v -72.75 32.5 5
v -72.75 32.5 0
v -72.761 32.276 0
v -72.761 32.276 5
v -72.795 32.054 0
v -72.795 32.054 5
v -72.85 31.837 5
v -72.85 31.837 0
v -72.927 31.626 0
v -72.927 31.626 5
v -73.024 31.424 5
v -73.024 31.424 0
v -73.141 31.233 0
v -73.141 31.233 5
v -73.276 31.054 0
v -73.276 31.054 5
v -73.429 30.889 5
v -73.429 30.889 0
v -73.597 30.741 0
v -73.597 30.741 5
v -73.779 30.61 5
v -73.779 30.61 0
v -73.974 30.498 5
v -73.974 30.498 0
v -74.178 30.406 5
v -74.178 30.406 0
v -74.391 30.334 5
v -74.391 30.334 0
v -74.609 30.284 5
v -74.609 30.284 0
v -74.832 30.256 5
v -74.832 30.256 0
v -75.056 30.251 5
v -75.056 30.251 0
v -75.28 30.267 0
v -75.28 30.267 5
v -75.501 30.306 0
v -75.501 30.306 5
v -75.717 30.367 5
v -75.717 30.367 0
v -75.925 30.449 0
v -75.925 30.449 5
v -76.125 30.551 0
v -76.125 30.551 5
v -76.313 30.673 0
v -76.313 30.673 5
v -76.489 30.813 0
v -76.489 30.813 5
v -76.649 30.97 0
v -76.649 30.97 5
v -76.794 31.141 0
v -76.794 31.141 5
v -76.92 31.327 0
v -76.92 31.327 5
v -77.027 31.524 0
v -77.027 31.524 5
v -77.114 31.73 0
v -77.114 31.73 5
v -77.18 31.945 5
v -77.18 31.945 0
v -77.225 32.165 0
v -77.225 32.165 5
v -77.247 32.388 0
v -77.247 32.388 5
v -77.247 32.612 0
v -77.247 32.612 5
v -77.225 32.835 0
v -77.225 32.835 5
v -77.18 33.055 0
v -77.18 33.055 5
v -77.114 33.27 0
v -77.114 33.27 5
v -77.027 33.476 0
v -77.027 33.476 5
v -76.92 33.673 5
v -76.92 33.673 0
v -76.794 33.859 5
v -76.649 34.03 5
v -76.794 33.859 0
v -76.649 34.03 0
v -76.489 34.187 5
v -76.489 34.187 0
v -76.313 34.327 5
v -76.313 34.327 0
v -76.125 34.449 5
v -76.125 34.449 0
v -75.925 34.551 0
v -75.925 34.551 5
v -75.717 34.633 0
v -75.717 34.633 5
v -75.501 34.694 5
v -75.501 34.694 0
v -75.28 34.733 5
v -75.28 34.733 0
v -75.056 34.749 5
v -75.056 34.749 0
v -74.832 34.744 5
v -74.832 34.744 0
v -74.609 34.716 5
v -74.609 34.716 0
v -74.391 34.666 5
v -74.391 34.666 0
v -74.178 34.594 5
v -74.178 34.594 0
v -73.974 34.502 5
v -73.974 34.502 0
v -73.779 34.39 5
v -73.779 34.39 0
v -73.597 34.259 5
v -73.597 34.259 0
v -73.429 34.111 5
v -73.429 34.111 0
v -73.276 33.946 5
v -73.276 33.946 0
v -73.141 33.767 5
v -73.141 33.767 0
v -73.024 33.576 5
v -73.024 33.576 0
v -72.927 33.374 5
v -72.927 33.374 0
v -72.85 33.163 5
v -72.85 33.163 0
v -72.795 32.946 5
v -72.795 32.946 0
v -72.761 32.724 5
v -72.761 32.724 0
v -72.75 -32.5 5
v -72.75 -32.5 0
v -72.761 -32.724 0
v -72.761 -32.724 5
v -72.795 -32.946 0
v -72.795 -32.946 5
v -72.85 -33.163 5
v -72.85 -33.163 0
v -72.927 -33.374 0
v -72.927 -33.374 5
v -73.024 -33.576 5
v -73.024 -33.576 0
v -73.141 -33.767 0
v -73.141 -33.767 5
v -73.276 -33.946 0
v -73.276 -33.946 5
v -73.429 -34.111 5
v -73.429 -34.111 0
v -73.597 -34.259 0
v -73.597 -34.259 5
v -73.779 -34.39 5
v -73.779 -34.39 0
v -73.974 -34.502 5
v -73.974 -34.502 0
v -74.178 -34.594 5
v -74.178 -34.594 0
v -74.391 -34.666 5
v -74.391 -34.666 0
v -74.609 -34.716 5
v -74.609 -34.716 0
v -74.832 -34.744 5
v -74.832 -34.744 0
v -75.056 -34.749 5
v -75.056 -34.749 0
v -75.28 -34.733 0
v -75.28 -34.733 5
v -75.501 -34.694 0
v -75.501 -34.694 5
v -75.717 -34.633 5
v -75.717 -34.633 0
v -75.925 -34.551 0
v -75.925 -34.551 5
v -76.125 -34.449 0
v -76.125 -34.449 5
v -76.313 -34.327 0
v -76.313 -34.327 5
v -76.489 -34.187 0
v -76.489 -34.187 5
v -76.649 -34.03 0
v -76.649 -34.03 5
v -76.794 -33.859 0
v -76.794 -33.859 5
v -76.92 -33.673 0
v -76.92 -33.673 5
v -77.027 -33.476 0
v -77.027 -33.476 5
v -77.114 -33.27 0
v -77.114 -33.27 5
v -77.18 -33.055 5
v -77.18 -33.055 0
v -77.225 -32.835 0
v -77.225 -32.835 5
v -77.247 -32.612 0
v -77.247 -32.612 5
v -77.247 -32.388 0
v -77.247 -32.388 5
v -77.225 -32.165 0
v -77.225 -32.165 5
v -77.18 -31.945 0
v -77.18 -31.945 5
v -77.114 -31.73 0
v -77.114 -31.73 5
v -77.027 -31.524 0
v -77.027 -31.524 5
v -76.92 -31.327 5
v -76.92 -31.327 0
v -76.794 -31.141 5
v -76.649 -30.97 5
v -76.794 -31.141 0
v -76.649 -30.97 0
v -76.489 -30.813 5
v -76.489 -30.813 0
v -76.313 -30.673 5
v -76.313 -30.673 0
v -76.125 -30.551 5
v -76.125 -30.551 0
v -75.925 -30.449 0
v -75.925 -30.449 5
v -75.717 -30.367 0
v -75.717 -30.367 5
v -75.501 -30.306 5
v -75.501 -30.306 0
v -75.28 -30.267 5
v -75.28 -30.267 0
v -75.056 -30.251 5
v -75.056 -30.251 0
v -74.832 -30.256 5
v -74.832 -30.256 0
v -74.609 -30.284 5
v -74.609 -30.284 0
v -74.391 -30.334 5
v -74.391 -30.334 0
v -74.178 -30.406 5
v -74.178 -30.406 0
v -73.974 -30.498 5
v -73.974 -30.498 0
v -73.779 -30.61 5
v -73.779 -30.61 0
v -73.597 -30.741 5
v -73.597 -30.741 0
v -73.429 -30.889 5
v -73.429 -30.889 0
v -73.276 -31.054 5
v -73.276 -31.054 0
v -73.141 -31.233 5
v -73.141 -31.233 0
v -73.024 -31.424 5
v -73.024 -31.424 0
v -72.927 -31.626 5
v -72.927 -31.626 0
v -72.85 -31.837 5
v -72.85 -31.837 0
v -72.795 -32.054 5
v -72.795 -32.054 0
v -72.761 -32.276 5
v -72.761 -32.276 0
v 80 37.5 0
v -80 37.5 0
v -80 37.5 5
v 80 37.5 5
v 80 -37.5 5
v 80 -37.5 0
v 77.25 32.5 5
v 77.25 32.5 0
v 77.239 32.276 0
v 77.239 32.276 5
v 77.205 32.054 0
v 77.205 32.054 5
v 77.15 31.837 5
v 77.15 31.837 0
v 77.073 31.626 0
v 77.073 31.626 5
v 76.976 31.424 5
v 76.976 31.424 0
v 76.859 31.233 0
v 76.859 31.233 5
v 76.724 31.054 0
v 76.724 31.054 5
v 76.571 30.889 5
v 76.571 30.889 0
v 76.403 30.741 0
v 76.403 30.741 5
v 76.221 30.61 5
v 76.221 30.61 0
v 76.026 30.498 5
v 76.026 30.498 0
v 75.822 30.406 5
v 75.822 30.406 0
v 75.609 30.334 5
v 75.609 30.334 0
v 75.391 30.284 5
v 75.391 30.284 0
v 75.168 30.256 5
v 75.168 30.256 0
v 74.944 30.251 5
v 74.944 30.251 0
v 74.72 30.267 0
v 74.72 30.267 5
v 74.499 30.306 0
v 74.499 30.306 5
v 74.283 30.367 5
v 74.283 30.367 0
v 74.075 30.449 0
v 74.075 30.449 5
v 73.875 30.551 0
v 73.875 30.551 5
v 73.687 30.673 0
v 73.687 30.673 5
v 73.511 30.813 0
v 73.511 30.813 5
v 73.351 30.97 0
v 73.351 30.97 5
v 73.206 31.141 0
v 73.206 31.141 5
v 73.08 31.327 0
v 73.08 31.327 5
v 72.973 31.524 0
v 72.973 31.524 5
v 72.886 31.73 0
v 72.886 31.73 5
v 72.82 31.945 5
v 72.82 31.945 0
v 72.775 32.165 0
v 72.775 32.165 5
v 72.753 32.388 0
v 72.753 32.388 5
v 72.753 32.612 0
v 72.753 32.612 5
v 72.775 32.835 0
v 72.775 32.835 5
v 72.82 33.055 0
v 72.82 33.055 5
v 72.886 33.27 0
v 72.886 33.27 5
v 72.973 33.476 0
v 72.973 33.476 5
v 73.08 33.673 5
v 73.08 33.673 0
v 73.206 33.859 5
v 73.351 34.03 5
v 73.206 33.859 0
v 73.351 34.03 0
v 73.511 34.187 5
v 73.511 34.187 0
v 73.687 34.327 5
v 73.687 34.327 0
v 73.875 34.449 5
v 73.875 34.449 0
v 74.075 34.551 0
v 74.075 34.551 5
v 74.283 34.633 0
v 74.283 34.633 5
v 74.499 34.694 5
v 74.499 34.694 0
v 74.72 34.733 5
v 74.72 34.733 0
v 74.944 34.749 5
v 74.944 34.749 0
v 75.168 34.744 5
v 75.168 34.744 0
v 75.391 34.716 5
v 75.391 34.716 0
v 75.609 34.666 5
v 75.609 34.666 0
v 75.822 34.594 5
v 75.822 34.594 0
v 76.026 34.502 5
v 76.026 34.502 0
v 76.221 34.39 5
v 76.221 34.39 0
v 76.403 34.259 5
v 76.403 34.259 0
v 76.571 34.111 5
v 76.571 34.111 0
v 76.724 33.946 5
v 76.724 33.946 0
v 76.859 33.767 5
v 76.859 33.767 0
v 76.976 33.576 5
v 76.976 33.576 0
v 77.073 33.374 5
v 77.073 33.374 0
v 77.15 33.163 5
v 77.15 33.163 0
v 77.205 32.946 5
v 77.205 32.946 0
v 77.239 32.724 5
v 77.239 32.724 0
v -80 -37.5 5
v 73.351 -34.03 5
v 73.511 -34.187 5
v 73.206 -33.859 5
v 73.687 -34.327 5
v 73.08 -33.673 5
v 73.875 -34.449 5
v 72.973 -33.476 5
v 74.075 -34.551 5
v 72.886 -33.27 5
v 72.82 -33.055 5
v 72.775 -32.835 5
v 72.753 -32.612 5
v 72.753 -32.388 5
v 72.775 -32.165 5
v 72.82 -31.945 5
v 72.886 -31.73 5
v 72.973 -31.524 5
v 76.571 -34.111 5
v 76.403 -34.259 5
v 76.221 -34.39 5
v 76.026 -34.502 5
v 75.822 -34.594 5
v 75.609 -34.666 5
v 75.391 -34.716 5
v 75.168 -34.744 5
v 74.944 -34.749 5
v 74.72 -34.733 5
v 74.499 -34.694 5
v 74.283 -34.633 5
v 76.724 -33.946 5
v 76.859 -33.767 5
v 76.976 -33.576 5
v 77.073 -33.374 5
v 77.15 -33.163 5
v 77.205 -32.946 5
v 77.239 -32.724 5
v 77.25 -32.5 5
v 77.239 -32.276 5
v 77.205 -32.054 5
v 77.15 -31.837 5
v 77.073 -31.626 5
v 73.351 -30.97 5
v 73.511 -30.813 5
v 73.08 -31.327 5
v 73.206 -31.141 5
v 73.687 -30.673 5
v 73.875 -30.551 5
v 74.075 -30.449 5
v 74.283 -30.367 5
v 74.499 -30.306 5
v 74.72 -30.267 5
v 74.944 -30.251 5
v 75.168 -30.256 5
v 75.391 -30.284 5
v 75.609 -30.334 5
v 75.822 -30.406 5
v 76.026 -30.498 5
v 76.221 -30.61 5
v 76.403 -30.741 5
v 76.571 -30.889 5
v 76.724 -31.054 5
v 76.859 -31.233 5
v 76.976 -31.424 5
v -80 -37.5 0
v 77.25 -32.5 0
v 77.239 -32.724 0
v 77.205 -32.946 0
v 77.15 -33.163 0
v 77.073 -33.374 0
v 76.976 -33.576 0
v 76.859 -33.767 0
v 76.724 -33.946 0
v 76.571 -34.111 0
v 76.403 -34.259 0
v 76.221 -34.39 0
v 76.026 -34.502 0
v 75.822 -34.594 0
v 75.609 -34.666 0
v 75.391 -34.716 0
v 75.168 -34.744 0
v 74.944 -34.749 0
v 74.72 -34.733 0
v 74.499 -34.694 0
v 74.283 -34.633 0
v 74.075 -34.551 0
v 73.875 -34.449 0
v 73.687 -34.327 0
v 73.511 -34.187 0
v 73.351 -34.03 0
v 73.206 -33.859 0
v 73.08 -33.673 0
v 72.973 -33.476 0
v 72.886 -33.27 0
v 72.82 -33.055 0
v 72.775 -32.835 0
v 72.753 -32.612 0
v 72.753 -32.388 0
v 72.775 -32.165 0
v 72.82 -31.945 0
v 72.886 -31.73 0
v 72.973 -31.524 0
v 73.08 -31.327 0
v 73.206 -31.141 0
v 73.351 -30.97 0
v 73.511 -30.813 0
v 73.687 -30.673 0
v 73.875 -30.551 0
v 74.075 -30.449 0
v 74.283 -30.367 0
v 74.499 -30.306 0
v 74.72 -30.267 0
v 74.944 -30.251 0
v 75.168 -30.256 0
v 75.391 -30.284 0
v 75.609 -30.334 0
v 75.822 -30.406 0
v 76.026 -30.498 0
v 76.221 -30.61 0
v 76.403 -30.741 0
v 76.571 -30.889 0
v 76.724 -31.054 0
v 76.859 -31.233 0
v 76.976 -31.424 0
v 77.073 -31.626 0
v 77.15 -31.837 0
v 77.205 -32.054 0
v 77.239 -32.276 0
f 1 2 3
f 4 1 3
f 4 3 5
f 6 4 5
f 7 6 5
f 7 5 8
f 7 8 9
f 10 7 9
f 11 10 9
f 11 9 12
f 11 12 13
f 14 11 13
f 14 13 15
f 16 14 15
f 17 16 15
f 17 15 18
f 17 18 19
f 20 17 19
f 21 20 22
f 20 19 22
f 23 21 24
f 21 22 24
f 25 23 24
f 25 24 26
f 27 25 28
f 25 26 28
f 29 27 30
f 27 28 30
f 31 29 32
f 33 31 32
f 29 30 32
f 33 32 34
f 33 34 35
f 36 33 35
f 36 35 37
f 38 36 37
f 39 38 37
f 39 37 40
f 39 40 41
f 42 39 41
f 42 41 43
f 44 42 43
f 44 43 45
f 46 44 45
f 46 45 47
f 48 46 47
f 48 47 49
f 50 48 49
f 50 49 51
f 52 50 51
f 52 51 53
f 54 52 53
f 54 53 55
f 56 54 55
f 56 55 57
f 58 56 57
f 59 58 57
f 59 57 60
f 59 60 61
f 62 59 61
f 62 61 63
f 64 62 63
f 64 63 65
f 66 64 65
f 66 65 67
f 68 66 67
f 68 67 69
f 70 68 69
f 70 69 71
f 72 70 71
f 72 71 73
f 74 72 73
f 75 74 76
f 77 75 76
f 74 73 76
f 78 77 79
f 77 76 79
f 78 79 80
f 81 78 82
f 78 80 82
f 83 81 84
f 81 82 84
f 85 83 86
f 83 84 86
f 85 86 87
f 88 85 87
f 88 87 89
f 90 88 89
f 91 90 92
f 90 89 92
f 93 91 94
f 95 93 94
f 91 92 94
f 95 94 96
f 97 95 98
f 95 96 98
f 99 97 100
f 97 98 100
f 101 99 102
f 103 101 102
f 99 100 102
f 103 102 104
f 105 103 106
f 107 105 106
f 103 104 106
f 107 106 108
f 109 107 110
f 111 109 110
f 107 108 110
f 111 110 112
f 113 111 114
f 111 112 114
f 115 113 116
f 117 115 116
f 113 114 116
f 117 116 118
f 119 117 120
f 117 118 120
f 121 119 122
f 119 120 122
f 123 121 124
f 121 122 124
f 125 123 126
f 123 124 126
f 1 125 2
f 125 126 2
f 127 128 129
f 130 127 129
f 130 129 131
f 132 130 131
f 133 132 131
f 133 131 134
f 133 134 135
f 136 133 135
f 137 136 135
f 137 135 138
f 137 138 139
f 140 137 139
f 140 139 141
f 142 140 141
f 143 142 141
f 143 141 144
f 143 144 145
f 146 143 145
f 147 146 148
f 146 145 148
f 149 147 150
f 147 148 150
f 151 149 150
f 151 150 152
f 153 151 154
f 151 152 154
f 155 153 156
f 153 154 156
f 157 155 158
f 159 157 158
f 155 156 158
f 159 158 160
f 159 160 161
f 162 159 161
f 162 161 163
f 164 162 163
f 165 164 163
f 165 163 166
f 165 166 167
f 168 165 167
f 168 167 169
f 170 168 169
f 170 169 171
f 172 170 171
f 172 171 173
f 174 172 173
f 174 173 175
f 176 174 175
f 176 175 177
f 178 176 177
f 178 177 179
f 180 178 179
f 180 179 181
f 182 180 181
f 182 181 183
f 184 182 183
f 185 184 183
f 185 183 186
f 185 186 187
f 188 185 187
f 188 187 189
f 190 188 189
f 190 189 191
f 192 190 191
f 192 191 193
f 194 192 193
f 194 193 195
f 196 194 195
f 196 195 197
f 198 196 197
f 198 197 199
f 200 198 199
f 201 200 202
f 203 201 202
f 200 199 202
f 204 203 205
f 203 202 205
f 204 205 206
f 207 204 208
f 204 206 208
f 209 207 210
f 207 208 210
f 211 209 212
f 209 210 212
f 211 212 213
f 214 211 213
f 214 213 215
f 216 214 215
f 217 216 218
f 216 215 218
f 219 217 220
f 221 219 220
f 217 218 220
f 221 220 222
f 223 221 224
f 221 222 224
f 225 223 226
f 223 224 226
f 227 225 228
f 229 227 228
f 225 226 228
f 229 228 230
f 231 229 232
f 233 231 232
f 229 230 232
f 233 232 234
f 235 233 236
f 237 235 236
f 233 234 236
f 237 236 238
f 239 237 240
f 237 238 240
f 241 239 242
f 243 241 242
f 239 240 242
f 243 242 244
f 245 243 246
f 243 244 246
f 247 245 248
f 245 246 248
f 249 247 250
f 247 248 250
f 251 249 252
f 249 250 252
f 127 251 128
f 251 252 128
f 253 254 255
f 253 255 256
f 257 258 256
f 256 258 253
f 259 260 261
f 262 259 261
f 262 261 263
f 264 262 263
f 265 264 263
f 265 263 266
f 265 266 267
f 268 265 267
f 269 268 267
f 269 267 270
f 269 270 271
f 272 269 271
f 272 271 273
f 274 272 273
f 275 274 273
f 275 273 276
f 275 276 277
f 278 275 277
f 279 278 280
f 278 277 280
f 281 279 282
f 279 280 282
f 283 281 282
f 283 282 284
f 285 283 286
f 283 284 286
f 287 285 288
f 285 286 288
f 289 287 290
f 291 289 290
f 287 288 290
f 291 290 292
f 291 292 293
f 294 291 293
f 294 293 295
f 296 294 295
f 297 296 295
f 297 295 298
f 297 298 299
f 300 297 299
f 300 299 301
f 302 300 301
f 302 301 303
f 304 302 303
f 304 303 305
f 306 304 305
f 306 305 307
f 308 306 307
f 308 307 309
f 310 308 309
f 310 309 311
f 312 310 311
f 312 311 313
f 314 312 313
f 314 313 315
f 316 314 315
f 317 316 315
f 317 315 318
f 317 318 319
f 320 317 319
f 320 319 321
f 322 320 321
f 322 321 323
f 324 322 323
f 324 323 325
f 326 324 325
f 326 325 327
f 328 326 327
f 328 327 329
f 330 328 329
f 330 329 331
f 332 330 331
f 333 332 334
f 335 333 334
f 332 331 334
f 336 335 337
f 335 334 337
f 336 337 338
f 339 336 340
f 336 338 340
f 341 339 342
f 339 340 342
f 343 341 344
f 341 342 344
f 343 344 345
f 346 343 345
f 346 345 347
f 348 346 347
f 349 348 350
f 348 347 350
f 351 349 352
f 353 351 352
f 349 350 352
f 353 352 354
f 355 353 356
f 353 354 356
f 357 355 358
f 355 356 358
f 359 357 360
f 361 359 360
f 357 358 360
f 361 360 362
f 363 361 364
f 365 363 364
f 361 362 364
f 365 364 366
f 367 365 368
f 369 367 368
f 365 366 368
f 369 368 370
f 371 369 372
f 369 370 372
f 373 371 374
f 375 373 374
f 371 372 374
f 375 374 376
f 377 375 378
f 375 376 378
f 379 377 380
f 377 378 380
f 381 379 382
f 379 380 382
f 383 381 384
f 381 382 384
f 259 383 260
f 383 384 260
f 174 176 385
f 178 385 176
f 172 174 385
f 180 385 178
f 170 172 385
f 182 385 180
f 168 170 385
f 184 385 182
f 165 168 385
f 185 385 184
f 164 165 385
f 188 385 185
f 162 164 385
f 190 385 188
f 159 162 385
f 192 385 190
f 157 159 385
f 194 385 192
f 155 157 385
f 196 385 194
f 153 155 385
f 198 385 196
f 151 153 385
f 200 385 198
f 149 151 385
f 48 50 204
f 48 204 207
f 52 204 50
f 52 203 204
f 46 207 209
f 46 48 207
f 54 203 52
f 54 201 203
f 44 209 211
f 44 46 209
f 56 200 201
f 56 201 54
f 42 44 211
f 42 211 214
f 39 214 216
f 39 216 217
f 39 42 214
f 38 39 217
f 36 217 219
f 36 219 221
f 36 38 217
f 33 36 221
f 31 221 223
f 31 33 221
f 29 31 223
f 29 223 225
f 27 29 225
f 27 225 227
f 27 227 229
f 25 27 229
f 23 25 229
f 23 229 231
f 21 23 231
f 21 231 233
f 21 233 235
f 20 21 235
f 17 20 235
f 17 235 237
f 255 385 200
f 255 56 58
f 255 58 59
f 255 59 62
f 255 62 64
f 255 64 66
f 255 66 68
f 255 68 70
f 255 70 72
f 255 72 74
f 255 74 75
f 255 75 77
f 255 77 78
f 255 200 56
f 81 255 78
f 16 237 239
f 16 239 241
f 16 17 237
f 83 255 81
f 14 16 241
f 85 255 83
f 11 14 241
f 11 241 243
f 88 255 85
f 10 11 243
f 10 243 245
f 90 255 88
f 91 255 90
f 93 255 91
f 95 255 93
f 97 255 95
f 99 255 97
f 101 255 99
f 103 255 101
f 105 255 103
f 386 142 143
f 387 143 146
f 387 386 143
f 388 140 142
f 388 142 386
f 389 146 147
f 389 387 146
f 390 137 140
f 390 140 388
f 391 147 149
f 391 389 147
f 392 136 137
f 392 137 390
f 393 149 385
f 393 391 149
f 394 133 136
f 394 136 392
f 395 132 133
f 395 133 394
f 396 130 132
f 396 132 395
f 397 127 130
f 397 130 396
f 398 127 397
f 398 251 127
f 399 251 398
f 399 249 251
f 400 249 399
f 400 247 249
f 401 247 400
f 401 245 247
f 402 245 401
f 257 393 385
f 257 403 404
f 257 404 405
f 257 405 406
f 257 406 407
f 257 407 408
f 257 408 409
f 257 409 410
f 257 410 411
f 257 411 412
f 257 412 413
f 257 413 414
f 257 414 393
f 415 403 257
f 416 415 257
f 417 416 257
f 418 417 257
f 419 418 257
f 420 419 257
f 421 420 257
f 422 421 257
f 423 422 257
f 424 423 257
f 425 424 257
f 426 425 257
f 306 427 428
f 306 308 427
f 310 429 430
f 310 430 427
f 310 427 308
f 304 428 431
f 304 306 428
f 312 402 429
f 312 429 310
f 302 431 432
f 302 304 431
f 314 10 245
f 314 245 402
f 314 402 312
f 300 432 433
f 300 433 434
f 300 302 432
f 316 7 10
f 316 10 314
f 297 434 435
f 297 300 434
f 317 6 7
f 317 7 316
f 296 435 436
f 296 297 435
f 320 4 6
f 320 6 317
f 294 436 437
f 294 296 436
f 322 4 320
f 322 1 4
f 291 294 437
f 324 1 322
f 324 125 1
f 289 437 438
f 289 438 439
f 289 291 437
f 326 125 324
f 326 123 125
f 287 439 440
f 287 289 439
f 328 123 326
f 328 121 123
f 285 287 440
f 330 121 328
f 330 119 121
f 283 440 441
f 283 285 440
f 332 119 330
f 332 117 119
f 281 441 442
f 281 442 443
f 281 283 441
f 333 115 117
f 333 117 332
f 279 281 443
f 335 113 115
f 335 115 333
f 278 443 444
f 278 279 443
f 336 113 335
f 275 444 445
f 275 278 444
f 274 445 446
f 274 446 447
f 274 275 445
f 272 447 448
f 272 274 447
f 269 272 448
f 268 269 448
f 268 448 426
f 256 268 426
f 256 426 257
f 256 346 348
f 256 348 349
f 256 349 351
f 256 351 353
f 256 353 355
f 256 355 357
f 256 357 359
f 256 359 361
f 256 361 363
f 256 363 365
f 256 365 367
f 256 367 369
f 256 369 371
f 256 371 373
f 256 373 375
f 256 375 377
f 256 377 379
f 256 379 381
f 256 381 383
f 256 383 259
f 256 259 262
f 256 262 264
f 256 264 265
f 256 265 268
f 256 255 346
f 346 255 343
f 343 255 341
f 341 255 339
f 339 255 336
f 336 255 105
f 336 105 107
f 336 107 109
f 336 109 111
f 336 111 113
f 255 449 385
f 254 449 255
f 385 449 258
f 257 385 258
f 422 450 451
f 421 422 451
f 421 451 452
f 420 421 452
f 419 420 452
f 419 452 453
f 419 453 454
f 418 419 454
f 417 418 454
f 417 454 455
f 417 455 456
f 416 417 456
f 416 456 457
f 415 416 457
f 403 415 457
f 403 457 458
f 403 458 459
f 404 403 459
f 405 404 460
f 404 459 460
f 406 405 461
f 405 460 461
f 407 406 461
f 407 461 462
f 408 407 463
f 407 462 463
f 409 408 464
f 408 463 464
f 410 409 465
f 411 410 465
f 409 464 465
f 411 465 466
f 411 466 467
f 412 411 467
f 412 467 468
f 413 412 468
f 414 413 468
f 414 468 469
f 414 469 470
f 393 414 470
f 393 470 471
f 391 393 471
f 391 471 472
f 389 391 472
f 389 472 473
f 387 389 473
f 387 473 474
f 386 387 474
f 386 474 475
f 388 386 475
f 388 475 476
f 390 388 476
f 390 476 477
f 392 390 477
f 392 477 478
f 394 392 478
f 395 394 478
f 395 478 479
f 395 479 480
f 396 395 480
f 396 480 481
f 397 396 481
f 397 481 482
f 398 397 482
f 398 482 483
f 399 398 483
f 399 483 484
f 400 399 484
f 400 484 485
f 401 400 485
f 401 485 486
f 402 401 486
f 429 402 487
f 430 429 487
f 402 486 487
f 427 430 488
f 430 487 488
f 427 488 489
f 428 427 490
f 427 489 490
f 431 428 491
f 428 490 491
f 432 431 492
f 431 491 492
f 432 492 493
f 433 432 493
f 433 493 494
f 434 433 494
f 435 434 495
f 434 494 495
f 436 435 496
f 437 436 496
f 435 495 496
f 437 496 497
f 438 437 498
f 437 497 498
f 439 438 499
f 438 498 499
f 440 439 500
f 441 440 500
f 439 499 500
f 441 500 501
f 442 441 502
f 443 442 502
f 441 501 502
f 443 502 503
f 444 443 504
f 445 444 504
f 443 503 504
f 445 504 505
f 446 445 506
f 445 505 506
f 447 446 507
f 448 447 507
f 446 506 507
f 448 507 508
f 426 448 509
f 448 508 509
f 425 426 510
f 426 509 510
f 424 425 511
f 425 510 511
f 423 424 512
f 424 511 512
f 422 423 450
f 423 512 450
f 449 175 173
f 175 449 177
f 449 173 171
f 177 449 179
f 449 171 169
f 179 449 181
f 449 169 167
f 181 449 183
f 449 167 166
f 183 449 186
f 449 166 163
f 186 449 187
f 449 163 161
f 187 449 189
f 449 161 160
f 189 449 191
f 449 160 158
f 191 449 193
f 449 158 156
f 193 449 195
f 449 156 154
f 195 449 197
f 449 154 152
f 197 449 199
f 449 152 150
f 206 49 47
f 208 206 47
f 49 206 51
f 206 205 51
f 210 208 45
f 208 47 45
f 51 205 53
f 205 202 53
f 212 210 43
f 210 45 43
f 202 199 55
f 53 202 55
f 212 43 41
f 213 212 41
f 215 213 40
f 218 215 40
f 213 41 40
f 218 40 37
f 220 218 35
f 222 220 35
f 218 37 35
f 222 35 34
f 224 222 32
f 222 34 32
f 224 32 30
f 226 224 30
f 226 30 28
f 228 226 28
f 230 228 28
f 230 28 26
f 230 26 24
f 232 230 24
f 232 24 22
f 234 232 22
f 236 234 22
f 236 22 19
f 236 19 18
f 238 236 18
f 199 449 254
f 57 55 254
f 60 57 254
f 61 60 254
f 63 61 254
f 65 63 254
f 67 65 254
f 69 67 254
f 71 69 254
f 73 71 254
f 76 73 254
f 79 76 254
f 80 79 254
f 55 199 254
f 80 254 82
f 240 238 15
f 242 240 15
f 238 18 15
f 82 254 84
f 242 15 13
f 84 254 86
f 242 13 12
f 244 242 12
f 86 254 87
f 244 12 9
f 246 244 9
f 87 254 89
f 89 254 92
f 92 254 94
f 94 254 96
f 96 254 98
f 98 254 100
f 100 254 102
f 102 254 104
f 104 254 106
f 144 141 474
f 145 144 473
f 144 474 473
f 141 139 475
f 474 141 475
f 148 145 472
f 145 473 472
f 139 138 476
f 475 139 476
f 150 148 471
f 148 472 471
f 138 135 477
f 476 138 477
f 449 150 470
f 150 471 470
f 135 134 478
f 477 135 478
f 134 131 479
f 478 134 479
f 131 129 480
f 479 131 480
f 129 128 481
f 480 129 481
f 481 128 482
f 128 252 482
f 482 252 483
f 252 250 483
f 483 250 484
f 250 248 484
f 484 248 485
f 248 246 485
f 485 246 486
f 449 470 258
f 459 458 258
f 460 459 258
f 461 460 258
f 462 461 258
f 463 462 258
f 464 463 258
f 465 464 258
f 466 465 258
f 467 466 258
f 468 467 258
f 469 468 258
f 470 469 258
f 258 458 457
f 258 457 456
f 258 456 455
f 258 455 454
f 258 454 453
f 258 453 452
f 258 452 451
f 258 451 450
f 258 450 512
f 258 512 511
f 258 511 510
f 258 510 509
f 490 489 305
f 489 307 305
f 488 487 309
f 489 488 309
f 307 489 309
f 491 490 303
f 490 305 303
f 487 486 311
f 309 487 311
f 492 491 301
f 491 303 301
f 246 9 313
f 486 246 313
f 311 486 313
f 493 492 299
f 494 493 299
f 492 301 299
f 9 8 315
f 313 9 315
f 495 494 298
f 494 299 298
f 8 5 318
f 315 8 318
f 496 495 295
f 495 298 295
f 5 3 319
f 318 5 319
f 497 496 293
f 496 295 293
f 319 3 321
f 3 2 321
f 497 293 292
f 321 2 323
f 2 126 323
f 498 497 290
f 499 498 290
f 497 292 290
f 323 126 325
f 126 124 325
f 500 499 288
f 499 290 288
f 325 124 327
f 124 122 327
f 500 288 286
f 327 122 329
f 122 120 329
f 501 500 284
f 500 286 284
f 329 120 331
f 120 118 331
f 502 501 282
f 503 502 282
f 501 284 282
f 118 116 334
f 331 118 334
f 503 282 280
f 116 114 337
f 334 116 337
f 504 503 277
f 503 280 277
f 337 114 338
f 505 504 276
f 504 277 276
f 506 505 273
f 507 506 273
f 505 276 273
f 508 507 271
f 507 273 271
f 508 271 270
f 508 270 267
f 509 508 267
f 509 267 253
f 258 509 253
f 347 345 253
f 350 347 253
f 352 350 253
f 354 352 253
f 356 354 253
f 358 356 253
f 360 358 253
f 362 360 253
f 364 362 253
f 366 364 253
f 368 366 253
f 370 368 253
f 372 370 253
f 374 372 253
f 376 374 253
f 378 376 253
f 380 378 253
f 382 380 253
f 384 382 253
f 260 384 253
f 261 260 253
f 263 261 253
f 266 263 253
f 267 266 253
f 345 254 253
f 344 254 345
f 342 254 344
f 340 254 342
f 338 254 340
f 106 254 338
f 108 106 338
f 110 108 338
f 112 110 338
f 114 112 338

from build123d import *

# Parameters (mm, degrees)
SKETCH_W    = 160
SKETCH_H    = 75
PAD_DEPTH   = 5
SKETCH001_R = 2.25
HOLE_DEPTH  = 5.001


with BuildPart() as part:
    # Sketch → Pad (new body)
    with BuildSketch(Plane.XY):
        Rectangle(SKETCH_W, SKETCH_H)
    extrude(amount=PAD_DEPTH)

    # Sketch001 (on Face5 of Pad) → Hole (cut, through all)
    with BuildSketch(Plane(origin=(0, 0, 0), x_dir=(1, 0, 0), z_dir=(0, 0, -1))):
        with Locations((-75, 32.5)):
            Circle(SKETCH001_R)
        with Locations((75, 32.5)):
            Circle(SKETCH001_R)
        with Locations((75, -32.5)):
            Circle(SKETCH001_R)
        with Locations((-75, -32.5)):
            Circle(SKETCH001_R)
    extrude(amount=-HOLE_DEPTH, mode=Mode.SUBTRACT)


solid = part.part
